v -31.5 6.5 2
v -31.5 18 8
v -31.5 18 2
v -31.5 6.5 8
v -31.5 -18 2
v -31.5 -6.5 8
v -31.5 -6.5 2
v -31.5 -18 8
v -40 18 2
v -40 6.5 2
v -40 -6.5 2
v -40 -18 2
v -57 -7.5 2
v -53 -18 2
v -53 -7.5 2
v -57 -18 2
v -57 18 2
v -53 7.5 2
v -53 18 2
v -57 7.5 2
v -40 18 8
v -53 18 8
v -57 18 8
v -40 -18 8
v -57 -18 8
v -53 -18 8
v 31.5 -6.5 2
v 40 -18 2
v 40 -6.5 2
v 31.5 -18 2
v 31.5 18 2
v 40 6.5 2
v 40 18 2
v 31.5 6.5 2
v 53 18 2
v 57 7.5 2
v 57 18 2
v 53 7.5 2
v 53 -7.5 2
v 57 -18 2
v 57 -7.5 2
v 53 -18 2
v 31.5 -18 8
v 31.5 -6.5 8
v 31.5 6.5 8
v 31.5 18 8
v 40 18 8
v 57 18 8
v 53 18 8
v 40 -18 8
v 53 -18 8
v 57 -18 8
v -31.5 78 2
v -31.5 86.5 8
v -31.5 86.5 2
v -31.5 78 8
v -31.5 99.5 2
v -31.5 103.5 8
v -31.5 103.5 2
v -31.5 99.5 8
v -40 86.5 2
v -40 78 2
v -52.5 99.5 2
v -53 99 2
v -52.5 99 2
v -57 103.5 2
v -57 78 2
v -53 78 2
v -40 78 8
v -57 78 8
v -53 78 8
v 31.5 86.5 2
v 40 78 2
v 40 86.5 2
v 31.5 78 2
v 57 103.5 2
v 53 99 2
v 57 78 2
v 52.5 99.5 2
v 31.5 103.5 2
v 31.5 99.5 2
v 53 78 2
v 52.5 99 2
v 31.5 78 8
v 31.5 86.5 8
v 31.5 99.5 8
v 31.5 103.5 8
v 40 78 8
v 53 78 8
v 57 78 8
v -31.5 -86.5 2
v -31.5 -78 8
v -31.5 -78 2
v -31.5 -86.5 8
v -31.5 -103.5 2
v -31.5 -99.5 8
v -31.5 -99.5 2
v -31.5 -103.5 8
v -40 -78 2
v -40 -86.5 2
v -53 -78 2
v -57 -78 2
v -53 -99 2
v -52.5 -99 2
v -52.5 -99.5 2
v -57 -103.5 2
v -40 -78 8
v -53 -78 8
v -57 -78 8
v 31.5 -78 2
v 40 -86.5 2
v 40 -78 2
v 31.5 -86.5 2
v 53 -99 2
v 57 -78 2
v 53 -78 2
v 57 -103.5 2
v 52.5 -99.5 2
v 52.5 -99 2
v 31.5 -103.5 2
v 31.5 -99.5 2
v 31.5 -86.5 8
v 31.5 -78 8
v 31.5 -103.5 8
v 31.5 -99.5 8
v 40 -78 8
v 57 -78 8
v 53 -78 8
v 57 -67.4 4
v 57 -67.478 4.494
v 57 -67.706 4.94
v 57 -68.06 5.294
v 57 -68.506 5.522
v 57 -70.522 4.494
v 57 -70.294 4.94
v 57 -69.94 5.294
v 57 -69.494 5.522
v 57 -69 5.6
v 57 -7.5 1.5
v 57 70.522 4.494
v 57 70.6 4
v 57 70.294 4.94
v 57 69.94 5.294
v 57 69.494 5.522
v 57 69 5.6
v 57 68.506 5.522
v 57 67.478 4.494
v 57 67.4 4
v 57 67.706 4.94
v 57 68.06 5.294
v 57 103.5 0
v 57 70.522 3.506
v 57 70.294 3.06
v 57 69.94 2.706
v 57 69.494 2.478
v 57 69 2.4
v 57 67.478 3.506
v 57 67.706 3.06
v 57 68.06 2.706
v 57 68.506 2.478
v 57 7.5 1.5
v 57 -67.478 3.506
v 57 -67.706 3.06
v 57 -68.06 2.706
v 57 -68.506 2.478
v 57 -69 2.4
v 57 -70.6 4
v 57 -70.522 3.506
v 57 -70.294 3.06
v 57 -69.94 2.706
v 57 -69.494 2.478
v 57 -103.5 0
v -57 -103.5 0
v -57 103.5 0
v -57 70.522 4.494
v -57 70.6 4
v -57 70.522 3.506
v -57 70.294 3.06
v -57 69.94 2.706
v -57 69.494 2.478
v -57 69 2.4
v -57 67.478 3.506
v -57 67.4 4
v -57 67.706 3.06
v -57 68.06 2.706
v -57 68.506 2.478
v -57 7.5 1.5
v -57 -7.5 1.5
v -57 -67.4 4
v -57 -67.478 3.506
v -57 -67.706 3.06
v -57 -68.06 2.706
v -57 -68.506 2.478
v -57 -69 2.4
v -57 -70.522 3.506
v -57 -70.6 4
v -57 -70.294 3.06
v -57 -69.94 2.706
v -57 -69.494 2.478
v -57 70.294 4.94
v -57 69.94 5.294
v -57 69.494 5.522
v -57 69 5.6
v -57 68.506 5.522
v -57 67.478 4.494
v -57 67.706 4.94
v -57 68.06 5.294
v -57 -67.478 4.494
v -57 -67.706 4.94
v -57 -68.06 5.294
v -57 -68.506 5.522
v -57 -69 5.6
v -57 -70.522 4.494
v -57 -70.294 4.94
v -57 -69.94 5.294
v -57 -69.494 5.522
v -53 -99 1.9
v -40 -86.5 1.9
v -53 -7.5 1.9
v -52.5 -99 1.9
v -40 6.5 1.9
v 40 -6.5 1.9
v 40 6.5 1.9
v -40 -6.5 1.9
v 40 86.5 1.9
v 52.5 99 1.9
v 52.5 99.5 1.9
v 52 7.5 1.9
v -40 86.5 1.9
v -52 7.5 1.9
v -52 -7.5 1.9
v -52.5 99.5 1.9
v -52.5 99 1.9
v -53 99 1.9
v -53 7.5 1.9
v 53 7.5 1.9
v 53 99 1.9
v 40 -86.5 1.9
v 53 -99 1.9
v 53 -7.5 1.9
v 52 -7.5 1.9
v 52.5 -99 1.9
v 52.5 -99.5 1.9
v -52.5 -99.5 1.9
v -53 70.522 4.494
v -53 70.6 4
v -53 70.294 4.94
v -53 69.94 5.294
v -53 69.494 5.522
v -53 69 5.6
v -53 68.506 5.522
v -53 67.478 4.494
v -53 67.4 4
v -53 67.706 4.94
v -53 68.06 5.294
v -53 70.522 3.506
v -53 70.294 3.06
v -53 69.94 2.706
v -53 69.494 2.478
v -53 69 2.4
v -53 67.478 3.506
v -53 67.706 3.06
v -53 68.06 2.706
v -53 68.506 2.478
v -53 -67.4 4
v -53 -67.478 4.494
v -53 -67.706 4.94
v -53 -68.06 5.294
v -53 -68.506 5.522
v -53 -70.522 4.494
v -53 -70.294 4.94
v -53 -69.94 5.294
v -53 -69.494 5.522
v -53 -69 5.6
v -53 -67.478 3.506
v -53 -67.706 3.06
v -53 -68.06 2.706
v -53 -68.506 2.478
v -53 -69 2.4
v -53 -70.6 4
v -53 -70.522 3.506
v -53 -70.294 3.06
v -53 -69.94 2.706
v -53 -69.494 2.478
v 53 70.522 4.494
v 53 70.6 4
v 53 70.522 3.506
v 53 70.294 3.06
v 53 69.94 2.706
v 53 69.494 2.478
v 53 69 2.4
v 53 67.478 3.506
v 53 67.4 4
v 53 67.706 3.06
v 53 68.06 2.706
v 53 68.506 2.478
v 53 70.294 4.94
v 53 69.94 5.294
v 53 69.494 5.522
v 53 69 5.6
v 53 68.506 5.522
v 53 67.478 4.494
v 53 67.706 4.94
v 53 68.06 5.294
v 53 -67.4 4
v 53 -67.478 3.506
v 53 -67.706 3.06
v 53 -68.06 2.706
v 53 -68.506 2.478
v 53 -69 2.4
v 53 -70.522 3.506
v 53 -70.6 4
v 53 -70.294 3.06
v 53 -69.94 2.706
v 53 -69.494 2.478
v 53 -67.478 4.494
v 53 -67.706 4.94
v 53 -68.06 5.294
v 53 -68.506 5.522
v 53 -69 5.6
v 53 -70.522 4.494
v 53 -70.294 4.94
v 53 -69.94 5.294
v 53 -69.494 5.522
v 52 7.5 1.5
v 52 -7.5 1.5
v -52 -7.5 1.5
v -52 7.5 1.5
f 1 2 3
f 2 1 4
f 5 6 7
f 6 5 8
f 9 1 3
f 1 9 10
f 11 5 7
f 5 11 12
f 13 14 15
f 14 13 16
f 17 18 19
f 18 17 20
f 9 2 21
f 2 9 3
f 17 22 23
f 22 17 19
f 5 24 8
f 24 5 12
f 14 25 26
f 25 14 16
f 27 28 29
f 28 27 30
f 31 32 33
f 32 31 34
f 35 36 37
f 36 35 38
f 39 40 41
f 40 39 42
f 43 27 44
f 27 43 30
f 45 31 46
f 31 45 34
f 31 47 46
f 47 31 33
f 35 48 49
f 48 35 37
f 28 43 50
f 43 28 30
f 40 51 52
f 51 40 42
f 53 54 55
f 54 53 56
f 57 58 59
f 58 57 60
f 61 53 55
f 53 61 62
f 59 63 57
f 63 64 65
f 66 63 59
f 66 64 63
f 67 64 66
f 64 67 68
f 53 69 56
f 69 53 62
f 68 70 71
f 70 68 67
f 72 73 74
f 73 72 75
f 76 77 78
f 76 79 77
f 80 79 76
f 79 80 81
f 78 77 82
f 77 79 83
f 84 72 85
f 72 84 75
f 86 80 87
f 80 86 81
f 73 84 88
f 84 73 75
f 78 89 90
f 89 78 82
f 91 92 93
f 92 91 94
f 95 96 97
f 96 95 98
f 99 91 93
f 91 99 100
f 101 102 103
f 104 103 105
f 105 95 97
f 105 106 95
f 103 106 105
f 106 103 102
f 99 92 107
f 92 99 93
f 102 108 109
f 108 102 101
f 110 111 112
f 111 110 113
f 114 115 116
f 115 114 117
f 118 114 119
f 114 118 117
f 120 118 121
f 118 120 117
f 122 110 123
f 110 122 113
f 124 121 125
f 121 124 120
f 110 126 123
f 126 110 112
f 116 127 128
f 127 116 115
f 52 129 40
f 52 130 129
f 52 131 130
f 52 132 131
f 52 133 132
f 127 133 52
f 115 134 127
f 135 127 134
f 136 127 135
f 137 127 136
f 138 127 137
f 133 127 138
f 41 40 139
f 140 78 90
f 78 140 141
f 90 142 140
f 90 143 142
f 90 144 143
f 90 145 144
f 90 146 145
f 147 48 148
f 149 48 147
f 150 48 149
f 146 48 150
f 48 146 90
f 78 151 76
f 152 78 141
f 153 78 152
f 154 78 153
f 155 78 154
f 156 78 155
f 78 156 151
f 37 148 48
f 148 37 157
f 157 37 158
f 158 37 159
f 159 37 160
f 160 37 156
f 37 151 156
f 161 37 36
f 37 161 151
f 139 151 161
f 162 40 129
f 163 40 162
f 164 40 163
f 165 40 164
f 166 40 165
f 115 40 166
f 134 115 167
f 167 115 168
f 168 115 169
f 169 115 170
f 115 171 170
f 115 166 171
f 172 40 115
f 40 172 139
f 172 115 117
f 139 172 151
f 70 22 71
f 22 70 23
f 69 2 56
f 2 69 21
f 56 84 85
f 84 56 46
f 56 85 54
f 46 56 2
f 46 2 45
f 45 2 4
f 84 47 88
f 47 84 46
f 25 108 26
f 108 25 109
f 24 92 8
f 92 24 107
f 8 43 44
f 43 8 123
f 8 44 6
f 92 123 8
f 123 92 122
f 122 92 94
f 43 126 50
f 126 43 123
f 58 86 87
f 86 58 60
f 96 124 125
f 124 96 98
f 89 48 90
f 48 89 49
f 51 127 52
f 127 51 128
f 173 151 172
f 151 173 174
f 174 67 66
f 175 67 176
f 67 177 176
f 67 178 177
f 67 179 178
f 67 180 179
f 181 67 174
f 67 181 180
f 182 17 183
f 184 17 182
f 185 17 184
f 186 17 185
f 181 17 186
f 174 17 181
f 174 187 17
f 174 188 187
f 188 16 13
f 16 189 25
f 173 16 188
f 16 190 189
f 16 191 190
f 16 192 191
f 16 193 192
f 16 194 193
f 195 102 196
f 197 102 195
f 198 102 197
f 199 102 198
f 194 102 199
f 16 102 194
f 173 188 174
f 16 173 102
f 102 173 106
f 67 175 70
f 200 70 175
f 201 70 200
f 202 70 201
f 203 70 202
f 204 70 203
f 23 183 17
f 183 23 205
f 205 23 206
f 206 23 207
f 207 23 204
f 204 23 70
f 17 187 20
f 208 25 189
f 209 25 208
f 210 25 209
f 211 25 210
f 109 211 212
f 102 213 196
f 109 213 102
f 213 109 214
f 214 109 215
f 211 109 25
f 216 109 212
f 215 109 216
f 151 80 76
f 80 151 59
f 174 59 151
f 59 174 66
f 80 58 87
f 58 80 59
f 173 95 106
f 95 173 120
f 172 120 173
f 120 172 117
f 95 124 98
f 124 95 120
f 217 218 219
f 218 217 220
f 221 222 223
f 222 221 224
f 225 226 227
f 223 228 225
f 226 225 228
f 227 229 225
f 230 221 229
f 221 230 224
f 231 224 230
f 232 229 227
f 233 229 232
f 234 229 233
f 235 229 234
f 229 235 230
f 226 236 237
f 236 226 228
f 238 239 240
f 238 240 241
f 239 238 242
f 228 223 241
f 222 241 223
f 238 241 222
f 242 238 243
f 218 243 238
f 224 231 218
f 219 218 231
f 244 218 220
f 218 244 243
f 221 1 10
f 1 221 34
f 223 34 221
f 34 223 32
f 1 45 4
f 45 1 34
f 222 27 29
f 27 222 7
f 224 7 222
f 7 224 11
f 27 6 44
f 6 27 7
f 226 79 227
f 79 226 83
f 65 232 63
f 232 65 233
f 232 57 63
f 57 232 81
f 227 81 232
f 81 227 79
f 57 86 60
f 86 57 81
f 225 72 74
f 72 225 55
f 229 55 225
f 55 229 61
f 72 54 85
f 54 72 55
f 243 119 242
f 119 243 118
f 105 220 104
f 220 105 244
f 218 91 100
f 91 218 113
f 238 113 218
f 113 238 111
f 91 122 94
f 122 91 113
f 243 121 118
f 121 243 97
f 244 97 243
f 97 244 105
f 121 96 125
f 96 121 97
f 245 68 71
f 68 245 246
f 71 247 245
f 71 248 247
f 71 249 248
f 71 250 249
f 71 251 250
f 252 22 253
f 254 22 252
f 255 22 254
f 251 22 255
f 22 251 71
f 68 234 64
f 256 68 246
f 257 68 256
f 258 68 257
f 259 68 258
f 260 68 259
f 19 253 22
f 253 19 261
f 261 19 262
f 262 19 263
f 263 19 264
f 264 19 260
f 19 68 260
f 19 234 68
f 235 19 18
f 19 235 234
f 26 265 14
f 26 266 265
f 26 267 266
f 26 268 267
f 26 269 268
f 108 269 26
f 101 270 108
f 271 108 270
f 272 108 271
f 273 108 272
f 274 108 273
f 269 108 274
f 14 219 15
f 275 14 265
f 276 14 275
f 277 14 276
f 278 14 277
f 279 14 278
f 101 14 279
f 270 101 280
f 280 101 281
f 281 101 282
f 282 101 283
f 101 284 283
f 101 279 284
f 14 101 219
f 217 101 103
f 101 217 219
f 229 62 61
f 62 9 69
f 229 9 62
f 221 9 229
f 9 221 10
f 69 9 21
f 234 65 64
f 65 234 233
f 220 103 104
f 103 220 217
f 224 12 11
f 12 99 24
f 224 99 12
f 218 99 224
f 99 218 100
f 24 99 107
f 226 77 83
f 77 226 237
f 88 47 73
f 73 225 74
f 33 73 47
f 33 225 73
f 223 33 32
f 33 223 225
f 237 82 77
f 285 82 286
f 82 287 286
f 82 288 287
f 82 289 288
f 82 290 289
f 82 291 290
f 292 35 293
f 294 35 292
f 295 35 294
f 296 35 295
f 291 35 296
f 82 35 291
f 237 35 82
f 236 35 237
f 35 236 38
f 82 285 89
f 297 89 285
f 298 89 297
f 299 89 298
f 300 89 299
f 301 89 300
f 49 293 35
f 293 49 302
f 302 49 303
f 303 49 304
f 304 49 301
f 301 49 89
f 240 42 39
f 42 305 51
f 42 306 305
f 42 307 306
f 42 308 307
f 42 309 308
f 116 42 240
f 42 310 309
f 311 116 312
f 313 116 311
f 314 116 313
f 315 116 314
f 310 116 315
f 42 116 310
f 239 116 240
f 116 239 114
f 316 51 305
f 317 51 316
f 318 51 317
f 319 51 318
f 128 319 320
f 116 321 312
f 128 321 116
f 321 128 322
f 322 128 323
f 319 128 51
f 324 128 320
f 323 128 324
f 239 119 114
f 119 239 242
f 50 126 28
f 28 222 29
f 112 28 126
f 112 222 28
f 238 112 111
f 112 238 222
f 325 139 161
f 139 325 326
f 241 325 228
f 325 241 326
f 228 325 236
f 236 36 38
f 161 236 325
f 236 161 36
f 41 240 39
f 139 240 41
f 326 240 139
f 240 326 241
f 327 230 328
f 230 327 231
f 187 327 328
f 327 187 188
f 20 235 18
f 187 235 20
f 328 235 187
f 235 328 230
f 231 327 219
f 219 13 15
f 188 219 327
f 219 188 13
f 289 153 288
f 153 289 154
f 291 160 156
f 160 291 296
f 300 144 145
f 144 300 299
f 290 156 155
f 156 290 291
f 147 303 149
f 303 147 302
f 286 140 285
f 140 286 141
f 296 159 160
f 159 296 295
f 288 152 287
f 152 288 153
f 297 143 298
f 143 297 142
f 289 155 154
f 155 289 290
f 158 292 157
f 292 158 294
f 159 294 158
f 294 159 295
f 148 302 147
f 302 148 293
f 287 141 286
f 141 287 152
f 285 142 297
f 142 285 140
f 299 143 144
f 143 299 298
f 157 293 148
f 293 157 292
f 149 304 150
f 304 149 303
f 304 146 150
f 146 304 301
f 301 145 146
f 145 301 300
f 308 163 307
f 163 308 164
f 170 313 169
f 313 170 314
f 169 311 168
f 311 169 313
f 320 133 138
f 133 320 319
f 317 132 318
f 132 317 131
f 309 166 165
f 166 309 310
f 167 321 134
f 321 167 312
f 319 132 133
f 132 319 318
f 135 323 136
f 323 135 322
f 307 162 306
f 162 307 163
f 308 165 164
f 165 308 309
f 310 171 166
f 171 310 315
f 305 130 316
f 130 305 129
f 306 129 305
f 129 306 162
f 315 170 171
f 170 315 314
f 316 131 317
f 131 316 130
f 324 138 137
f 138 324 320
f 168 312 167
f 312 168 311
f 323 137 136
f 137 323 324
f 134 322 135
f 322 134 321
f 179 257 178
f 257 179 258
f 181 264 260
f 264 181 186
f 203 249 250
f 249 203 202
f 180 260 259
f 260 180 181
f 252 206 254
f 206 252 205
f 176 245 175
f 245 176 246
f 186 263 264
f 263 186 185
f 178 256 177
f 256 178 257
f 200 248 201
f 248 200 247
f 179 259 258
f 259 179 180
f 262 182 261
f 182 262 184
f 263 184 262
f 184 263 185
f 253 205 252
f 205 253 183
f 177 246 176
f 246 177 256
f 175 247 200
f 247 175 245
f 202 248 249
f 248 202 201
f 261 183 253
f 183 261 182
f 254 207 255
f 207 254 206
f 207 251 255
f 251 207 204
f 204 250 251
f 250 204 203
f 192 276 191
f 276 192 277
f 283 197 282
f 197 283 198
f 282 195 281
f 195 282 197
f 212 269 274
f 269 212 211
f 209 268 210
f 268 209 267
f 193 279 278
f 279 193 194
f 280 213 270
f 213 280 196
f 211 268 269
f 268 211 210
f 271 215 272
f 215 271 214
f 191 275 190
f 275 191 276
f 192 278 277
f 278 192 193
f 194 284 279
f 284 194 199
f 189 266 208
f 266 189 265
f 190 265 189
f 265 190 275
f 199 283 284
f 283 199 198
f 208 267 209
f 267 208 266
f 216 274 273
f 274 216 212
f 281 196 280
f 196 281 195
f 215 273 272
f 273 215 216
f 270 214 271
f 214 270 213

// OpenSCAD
// 7-Segment Display Digit Housing (Monolithic Design)
// Configured for 93 mm parallel strip pitch, 105 mm total segment length with connector,
// 68 mm LED strip length, and 4.5 mm thick 90° corner connectors.

pitch = 93;
seg_length = 105;
strip_length = 68;
strip_width = 11;
strip_depth = 6;
wall = 2;
base_thickness = 2;

// Calculated dimensions
diffuser_w = strip_width + 2;
digit_width = pitch + diffuser_w + wall * 4;
digit_height = pitch * 2 + diffuser_w + wall * 4;
depth = strip_depth + base_thickness;

module segment() {
    translate([-seg_length/2, -diffuser_w/2, -0.1])
    cube([seg_length, diffuser_w, strip_depth + 0.2]);
}

module digit_body() {
    difference() {
        // Main block
        translate([-digit_width/2, -digit_height/2, 0])
            cube([digit_width, digit_height, depth]);
        
        // Segments cutout
        // G - Middle
        translate([0, 0, base_thickness])
            segment();
            
        // A - Top
        translate([0, pitch, base_thickness])
            segment();
            
        // D - Bottom
        translate([0, -pitch, base_thickness])
            segment();
            
        // F - Top Left
        translate([-pitch/2, pitch/2, base_thickness])
            rotate([0, 0, 90]) segment();
            
        // E - Bottom Left
        translate([-pitch/2, -pitch/2, base_thickness])
            rotate([0, 0, 90]) segment();
            
        // B - Top Right
        translate([pitch/2, pitch/2, base_thickness])
            rotate([0, 0, 90]) segment();
            
        // C - Bottom Right
        translate([pitch/2, -pitch/2, base_thickness])
            rotate([0, 0, 90]) segment();
            
        // Corner and T-junction connector pockets (4.5mm deep)
        translate([0, 0, base_thickness]) {
            // Middle left & right
            translate([-pitch/2, 0, 0]) translate([-15, -18, 0]) cube([30, 36, strip_depth + 0.1]);
            translate([pitch/2, 0, 0]) translate([-15, -18, 0]) cube([30, 36, strip_depth + 0.1]);
            
            // Top left & right
            translate([-pitch/2, pitch, 0]) translate([-15, -15, 0]) cube([30, 30, strip_depth + 0.1]);
            translate([pitch/2, pitch, 0]) translate([-15, -15, 0]) cube([30, 30, strip_depth + 0.1]);
            
            // Bottom left & right
            translate([-pitch/2, -pitch, 0]) translate([-15, -15, 0]) cube([30, 30, strip_depth + 0.1]);
            translate([pitch/2, -pitch, 0]) translate([-15, -15, 0]) cube([30, 30, strip_depth + 0.1]);
        }
        
        // Wire pass-through to next digit
        translate([digit_width/2, 0, base_thickness + strip_depth/2]) cube([10, 15, strip_depth + 1], center=true);
        translate([-digit_width/2, 0, base_thickness + strip_depth/2]) cube([10, 15, strip_depth + 1], center=true);
        
        // Screw holes for joining (M3 clearance holes = 3.2mm diameter)
        translate([digit_width/2, digit_height/3, depth/2]) rotate([0, 90, 0]) cylinder(h=10, r=1.6, center=true, $fn=20);
        translate([digit_width/2, -digit_height/3, depth/2]) rotate([0, 90, 0]) cylinder(h=10, r=1.6, center=true, $fn=20);
        translate([-digit_width/2, digit_height/3, depth/2]) rotate([0, 90, 0]) cylinder(h=10, r=1.6, center=true, $fn=20);
        translate([-digit_width/2, -digit_height/3, depth/2]) rotate([0, 90, 0]) cylinder(h=10, r=1.6, center=true, $fn=20);
    }
}

// Render the body
digit_body();
